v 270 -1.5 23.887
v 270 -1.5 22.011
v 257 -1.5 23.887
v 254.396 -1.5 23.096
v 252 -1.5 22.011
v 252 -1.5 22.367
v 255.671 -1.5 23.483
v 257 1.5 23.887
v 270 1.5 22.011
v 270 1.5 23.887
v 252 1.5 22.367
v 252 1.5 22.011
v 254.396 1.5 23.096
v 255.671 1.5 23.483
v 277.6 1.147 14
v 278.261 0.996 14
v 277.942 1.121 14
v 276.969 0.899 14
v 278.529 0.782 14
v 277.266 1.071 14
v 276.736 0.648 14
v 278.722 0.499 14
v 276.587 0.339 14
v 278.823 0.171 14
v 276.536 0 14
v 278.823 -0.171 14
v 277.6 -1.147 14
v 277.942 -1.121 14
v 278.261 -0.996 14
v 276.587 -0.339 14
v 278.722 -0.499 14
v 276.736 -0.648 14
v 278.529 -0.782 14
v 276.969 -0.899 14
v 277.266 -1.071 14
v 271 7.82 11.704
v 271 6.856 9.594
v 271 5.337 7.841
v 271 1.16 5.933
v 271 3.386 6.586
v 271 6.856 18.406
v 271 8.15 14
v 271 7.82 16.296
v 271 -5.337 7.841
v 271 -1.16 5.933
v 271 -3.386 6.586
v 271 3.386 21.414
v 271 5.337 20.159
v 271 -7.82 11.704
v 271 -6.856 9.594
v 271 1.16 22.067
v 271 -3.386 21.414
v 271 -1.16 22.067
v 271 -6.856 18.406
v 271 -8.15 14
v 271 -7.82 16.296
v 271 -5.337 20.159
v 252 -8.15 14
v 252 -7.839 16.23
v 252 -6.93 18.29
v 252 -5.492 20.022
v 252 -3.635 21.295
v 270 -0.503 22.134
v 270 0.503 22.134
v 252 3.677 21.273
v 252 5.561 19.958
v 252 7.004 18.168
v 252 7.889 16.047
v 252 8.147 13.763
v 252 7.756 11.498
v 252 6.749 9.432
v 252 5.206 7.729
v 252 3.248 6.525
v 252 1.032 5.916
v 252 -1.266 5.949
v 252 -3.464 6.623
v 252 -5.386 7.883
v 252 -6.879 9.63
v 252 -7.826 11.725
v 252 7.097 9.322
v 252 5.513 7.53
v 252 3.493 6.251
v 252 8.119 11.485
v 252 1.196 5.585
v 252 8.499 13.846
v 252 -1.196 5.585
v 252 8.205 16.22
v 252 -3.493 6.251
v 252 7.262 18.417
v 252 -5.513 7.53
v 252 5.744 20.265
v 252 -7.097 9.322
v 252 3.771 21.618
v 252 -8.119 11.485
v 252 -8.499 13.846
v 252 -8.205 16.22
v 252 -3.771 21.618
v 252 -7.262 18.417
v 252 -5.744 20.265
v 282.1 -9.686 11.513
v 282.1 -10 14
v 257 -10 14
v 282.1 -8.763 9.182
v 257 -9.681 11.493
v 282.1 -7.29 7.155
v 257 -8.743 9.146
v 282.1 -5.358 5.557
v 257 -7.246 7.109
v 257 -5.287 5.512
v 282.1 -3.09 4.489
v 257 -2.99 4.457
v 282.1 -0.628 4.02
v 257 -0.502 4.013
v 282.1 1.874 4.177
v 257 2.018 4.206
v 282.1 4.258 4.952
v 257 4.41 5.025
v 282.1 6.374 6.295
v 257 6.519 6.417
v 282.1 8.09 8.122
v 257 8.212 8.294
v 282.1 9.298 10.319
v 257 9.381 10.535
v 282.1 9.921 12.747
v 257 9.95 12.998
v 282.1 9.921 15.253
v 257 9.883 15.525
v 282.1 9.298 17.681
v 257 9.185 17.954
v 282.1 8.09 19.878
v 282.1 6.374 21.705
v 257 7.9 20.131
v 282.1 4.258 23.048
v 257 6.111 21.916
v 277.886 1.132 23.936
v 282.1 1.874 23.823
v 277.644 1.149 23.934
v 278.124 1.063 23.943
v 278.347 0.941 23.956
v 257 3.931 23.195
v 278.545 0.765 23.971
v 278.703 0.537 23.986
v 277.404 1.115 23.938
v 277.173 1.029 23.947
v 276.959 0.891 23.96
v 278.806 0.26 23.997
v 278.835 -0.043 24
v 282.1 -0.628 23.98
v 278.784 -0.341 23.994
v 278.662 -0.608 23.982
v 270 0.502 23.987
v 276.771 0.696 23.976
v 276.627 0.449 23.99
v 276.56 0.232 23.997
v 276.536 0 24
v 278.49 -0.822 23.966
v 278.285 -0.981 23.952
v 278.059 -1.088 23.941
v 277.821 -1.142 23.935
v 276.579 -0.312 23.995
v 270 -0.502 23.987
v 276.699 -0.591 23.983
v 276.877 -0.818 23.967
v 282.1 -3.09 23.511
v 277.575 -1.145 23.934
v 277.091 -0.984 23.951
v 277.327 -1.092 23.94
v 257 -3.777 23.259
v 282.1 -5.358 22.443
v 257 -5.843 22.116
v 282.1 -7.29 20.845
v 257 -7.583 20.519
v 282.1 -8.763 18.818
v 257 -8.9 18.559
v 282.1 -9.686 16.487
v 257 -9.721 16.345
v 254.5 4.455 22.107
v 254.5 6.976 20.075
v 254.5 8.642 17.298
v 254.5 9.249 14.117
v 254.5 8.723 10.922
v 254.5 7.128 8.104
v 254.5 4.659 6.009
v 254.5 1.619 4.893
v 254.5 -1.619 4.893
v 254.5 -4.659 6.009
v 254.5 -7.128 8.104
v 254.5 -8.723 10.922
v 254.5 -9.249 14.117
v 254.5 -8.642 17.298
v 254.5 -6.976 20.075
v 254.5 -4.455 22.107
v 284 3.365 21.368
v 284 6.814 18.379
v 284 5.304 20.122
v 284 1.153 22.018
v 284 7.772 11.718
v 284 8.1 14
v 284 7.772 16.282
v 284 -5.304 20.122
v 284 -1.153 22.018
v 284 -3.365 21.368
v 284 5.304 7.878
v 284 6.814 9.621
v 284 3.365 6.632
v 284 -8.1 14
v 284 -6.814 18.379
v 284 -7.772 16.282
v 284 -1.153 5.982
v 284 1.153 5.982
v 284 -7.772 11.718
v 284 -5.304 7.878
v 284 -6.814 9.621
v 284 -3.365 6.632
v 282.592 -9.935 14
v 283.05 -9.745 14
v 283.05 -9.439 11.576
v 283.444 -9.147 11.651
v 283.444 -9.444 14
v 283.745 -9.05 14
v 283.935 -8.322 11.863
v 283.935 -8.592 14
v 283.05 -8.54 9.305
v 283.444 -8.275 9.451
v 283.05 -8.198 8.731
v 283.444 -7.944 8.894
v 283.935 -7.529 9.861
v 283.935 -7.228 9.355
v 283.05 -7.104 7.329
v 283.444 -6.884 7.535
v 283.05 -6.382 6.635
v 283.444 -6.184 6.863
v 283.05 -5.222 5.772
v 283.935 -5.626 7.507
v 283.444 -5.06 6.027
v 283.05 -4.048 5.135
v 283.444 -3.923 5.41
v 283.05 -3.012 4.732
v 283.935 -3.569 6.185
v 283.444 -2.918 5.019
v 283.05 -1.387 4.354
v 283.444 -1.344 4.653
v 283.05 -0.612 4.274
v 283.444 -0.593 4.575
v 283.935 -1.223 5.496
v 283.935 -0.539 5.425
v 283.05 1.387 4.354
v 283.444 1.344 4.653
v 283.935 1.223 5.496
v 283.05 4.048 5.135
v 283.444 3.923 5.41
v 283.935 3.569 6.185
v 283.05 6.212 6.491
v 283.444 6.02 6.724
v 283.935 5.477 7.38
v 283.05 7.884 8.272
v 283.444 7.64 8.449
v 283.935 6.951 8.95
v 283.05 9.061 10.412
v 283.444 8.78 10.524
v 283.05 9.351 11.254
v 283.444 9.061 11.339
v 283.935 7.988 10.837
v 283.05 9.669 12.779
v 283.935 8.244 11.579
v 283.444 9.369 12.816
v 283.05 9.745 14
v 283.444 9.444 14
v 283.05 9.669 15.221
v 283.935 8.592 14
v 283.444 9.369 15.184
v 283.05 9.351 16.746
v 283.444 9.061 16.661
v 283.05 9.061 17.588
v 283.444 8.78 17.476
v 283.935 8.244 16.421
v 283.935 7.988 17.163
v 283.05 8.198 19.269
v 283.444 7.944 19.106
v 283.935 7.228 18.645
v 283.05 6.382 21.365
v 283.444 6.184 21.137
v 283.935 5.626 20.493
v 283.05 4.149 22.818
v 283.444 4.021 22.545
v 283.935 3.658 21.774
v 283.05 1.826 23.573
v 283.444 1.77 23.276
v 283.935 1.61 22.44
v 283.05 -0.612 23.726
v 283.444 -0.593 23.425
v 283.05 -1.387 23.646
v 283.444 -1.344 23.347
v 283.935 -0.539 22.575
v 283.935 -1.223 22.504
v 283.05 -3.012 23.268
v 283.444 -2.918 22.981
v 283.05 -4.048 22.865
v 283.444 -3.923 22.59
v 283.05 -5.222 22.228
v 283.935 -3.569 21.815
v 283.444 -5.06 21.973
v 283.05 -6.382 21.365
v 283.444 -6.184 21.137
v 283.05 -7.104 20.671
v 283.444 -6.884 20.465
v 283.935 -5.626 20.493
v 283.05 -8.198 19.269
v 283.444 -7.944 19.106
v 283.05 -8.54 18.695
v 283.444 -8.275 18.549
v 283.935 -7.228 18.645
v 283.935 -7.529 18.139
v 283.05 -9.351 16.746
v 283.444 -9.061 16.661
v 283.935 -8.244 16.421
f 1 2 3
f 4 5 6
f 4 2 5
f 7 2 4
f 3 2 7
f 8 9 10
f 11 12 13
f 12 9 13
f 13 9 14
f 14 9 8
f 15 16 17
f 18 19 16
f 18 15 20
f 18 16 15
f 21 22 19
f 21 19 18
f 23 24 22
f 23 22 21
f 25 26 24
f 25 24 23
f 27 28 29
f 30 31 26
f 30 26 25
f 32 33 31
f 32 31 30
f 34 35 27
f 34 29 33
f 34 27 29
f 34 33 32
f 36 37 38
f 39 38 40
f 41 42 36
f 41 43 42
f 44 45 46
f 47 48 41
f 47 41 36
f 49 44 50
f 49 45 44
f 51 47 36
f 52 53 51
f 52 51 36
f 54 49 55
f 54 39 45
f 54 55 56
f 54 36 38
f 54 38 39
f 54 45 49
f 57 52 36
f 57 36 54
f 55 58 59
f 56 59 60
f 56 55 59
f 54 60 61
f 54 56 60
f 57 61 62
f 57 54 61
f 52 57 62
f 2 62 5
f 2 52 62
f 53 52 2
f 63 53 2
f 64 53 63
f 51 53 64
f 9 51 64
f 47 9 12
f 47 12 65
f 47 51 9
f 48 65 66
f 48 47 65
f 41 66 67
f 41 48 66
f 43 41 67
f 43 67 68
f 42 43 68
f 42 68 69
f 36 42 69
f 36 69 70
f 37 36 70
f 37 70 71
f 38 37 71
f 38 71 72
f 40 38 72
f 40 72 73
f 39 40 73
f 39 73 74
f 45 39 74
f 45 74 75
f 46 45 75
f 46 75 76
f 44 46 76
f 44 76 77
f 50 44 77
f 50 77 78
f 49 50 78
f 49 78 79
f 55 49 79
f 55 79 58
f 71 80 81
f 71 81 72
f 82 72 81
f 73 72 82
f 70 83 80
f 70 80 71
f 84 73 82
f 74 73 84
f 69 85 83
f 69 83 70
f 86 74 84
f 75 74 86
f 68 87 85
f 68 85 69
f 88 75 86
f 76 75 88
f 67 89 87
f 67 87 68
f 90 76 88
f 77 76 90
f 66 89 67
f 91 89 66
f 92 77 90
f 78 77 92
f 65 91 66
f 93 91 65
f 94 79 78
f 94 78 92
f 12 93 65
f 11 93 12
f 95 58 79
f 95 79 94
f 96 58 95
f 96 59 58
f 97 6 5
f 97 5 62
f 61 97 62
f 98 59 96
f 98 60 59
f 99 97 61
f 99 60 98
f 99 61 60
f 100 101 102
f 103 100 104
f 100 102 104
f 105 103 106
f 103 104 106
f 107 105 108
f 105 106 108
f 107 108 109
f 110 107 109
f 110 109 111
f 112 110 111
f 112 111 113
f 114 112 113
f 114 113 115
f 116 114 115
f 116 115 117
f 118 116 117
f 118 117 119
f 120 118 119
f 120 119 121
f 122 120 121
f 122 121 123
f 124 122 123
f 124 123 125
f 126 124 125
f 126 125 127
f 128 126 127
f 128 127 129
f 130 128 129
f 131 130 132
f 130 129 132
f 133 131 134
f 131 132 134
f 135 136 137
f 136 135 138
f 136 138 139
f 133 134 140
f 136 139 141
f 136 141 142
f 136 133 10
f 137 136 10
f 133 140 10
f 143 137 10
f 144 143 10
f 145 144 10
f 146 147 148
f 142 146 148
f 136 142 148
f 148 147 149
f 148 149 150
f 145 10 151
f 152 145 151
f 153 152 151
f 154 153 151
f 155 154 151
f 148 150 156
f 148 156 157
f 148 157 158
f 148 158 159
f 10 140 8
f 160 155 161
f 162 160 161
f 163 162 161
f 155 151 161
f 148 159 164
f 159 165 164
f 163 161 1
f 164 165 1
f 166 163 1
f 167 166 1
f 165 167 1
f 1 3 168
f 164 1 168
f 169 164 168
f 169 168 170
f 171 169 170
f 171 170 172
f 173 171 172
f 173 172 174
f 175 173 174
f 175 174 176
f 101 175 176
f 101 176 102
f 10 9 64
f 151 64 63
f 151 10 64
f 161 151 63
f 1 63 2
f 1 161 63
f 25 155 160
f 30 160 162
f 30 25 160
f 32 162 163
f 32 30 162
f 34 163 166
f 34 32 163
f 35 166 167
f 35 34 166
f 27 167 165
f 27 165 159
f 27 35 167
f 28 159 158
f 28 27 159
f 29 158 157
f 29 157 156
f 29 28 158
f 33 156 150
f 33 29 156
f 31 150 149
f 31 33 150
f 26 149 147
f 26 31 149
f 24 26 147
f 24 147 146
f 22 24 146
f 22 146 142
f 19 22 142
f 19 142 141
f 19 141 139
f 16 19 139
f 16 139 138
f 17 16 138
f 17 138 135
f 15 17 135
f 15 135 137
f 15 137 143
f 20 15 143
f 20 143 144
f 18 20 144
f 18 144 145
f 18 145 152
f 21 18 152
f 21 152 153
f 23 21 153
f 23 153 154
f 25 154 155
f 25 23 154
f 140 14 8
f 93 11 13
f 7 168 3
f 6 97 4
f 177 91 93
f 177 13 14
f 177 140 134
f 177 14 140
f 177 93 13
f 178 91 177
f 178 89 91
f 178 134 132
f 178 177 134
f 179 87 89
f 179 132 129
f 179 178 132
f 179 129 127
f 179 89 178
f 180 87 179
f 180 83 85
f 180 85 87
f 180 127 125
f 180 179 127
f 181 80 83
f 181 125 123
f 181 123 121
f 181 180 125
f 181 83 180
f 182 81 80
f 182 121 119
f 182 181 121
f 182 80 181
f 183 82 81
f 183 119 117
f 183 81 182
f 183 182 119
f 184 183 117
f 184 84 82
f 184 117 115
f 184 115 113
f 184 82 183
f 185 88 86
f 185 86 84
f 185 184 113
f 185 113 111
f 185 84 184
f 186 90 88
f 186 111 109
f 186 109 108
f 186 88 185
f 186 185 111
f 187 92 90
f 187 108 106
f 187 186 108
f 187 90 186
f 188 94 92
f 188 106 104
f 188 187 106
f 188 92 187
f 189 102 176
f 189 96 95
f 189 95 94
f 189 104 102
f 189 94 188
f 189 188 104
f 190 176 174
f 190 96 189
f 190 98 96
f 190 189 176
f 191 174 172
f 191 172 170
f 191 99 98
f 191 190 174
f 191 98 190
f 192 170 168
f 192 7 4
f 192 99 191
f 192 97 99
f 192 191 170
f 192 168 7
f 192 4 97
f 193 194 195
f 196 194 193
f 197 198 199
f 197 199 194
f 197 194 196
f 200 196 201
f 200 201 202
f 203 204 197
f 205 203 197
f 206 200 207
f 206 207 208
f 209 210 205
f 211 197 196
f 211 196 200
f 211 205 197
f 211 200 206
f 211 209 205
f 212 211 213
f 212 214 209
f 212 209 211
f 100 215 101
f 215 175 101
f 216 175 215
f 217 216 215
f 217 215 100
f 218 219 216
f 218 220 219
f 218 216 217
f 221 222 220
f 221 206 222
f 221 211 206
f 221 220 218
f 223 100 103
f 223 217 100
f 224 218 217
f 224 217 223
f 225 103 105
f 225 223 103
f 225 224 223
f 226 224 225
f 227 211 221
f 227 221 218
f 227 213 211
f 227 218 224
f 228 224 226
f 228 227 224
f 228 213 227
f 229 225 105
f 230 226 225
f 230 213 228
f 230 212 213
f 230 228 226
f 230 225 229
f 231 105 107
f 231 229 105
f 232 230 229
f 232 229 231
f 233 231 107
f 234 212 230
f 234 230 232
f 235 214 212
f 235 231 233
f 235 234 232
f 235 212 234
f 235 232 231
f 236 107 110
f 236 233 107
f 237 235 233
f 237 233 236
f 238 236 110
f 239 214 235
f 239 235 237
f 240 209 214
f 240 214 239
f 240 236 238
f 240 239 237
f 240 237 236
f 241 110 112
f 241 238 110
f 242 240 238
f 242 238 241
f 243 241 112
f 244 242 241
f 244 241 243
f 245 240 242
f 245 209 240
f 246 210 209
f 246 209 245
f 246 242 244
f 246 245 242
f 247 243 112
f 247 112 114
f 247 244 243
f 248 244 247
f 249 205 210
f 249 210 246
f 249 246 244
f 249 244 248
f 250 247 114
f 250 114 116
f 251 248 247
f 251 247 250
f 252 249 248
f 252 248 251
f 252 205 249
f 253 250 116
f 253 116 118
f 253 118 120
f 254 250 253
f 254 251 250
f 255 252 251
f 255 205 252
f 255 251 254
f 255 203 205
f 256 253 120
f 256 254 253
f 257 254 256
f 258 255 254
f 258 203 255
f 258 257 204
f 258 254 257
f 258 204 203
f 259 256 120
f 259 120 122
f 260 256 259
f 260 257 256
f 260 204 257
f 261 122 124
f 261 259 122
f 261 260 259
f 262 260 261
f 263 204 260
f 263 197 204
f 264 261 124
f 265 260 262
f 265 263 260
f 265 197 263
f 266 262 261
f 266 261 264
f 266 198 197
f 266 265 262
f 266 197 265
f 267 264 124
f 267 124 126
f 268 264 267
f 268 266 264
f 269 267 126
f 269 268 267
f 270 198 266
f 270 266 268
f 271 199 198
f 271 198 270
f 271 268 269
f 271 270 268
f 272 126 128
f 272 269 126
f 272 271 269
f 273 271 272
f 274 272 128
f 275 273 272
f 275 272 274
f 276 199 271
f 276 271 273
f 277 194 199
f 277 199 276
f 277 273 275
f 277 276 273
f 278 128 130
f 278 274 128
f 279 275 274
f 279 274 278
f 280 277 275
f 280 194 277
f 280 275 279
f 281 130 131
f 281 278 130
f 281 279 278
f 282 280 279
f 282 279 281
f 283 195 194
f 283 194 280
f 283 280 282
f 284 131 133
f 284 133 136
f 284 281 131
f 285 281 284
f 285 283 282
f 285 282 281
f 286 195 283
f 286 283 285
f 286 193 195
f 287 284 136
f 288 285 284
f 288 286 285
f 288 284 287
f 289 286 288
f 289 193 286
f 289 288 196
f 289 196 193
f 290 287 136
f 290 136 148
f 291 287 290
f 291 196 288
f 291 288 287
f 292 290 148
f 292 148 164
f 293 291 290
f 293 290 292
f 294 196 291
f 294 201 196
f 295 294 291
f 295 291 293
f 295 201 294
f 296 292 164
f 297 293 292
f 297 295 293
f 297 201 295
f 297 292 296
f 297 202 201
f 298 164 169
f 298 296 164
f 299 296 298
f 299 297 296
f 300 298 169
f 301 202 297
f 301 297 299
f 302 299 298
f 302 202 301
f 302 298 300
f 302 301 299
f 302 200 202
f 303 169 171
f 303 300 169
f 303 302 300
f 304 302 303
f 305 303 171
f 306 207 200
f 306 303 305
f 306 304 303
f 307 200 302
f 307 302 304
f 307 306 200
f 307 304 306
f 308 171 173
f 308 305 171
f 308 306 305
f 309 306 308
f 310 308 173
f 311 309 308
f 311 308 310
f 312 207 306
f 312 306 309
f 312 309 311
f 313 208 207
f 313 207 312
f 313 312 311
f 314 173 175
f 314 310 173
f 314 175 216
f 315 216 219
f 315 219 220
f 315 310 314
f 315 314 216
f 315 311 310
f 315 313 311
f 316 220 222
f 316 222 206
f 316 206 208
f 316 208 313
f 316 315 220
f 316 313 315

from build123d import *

# Parameters (mm, degrees)
SKETCH009_R             = 10
SKETCH009_R_2           = 8.15
PAD005_DEPTH            = 30
SKETCH010_R             = 10
PAD006_DEPTH            = 2
SKETCH011_W             = 3
SKETCH011_H             = 13.298698
POCKET004_DEPTH         = 18
SKETCH013_R             = 8.553823
PAD007_DEPTH            = 11
SKETCH012_R             = 1.15
POCKET005_DEPTH         = 21
FILLET002_R             = 1.9
CHAMFER003_SIZE2        = 1.5
CHAMFER003_SIZE         = 5
BODY002_PLACEMENT_ANGLE = 180


with BuildPart() as part:
    # Sketch009 → Pad005 (new body)
    with BuildSketch(Plane.YZ):
        Circle(SKETCH009_R)
        Circle(SKETCH009_R_2, mode=Mode.SUBTRACT)
    extrude(amount=PAD005_DEPTH)

    # Sketch010 (on Face3 of Pad005) → Pad006 (join)
    with BuildSketch(Plane(origin=(0, 0, 0), x_dir=(0, 1, 0), z_dir=(-1, 0, 0))):
        Circle(SKETCH010_R)
    extrude(amount=PAD006_DEPTH)

    # Sketch011 (on Face3 of Pad006) → Pocket004 (cut)
    with BuildSketch(Plane.YZ.offset(30)):
        with Locations((0, 6.649349)):
            Rectangle(SKETCH011_W, SKETCH011_H)
    extrude(amount=-POCKET004_DEPTH, mode=Mode.SUBTRACT)

    # Sketch013 (on Face9 of Pocket004) → Pad007 (join)
    with BuildSketch(Plane.YZ):
        Circle(SKETCH013_R)
    extrude(amount=PAD007_DEPTH)

    # Sketch012 (on DatumPlane) → Pocket005 (cut)
    with BuildSketch(Plane.XY):
        with Locations((4.314017, 0)):
            Circle(SKETCH012_R)
    extrude(amount=POCKET005_DEPTH, mode=Mode.SUBTRACT)

    # Fillet002
    fillet002_edges = [part.edges().sort_by_distance(p)[0] for p in [
        (-2, -10, 0),
    ]]
    fillet(fillet002_edges, radius=FILLET002_R)

    # Chamfer003
    chamfer003_edges = [part.edges().sort_by_distance(p)[0] for p in [
        (30, -6.519202, -7.582875),
        (30, 7.582875, 6.519202),
    ]]
    chamfer003_side = part.faces().sort_by_distance((15, -10, 0))[0]
    chamfer(chamfer003_edges, length=CHAMFER003_SIZE, length2=CHAMFER003_SIZE2, reference=chamfer003_side)


with BuildPart() as part_1:
    # Body002 placement: moved
    add(part.part.moved(Location((282, 0, 14))).rotate(Axis((282, 0, 14), (0, 0, -1)), BODY002_PLACEMENT_ANGLE))


solid = part_1.part
